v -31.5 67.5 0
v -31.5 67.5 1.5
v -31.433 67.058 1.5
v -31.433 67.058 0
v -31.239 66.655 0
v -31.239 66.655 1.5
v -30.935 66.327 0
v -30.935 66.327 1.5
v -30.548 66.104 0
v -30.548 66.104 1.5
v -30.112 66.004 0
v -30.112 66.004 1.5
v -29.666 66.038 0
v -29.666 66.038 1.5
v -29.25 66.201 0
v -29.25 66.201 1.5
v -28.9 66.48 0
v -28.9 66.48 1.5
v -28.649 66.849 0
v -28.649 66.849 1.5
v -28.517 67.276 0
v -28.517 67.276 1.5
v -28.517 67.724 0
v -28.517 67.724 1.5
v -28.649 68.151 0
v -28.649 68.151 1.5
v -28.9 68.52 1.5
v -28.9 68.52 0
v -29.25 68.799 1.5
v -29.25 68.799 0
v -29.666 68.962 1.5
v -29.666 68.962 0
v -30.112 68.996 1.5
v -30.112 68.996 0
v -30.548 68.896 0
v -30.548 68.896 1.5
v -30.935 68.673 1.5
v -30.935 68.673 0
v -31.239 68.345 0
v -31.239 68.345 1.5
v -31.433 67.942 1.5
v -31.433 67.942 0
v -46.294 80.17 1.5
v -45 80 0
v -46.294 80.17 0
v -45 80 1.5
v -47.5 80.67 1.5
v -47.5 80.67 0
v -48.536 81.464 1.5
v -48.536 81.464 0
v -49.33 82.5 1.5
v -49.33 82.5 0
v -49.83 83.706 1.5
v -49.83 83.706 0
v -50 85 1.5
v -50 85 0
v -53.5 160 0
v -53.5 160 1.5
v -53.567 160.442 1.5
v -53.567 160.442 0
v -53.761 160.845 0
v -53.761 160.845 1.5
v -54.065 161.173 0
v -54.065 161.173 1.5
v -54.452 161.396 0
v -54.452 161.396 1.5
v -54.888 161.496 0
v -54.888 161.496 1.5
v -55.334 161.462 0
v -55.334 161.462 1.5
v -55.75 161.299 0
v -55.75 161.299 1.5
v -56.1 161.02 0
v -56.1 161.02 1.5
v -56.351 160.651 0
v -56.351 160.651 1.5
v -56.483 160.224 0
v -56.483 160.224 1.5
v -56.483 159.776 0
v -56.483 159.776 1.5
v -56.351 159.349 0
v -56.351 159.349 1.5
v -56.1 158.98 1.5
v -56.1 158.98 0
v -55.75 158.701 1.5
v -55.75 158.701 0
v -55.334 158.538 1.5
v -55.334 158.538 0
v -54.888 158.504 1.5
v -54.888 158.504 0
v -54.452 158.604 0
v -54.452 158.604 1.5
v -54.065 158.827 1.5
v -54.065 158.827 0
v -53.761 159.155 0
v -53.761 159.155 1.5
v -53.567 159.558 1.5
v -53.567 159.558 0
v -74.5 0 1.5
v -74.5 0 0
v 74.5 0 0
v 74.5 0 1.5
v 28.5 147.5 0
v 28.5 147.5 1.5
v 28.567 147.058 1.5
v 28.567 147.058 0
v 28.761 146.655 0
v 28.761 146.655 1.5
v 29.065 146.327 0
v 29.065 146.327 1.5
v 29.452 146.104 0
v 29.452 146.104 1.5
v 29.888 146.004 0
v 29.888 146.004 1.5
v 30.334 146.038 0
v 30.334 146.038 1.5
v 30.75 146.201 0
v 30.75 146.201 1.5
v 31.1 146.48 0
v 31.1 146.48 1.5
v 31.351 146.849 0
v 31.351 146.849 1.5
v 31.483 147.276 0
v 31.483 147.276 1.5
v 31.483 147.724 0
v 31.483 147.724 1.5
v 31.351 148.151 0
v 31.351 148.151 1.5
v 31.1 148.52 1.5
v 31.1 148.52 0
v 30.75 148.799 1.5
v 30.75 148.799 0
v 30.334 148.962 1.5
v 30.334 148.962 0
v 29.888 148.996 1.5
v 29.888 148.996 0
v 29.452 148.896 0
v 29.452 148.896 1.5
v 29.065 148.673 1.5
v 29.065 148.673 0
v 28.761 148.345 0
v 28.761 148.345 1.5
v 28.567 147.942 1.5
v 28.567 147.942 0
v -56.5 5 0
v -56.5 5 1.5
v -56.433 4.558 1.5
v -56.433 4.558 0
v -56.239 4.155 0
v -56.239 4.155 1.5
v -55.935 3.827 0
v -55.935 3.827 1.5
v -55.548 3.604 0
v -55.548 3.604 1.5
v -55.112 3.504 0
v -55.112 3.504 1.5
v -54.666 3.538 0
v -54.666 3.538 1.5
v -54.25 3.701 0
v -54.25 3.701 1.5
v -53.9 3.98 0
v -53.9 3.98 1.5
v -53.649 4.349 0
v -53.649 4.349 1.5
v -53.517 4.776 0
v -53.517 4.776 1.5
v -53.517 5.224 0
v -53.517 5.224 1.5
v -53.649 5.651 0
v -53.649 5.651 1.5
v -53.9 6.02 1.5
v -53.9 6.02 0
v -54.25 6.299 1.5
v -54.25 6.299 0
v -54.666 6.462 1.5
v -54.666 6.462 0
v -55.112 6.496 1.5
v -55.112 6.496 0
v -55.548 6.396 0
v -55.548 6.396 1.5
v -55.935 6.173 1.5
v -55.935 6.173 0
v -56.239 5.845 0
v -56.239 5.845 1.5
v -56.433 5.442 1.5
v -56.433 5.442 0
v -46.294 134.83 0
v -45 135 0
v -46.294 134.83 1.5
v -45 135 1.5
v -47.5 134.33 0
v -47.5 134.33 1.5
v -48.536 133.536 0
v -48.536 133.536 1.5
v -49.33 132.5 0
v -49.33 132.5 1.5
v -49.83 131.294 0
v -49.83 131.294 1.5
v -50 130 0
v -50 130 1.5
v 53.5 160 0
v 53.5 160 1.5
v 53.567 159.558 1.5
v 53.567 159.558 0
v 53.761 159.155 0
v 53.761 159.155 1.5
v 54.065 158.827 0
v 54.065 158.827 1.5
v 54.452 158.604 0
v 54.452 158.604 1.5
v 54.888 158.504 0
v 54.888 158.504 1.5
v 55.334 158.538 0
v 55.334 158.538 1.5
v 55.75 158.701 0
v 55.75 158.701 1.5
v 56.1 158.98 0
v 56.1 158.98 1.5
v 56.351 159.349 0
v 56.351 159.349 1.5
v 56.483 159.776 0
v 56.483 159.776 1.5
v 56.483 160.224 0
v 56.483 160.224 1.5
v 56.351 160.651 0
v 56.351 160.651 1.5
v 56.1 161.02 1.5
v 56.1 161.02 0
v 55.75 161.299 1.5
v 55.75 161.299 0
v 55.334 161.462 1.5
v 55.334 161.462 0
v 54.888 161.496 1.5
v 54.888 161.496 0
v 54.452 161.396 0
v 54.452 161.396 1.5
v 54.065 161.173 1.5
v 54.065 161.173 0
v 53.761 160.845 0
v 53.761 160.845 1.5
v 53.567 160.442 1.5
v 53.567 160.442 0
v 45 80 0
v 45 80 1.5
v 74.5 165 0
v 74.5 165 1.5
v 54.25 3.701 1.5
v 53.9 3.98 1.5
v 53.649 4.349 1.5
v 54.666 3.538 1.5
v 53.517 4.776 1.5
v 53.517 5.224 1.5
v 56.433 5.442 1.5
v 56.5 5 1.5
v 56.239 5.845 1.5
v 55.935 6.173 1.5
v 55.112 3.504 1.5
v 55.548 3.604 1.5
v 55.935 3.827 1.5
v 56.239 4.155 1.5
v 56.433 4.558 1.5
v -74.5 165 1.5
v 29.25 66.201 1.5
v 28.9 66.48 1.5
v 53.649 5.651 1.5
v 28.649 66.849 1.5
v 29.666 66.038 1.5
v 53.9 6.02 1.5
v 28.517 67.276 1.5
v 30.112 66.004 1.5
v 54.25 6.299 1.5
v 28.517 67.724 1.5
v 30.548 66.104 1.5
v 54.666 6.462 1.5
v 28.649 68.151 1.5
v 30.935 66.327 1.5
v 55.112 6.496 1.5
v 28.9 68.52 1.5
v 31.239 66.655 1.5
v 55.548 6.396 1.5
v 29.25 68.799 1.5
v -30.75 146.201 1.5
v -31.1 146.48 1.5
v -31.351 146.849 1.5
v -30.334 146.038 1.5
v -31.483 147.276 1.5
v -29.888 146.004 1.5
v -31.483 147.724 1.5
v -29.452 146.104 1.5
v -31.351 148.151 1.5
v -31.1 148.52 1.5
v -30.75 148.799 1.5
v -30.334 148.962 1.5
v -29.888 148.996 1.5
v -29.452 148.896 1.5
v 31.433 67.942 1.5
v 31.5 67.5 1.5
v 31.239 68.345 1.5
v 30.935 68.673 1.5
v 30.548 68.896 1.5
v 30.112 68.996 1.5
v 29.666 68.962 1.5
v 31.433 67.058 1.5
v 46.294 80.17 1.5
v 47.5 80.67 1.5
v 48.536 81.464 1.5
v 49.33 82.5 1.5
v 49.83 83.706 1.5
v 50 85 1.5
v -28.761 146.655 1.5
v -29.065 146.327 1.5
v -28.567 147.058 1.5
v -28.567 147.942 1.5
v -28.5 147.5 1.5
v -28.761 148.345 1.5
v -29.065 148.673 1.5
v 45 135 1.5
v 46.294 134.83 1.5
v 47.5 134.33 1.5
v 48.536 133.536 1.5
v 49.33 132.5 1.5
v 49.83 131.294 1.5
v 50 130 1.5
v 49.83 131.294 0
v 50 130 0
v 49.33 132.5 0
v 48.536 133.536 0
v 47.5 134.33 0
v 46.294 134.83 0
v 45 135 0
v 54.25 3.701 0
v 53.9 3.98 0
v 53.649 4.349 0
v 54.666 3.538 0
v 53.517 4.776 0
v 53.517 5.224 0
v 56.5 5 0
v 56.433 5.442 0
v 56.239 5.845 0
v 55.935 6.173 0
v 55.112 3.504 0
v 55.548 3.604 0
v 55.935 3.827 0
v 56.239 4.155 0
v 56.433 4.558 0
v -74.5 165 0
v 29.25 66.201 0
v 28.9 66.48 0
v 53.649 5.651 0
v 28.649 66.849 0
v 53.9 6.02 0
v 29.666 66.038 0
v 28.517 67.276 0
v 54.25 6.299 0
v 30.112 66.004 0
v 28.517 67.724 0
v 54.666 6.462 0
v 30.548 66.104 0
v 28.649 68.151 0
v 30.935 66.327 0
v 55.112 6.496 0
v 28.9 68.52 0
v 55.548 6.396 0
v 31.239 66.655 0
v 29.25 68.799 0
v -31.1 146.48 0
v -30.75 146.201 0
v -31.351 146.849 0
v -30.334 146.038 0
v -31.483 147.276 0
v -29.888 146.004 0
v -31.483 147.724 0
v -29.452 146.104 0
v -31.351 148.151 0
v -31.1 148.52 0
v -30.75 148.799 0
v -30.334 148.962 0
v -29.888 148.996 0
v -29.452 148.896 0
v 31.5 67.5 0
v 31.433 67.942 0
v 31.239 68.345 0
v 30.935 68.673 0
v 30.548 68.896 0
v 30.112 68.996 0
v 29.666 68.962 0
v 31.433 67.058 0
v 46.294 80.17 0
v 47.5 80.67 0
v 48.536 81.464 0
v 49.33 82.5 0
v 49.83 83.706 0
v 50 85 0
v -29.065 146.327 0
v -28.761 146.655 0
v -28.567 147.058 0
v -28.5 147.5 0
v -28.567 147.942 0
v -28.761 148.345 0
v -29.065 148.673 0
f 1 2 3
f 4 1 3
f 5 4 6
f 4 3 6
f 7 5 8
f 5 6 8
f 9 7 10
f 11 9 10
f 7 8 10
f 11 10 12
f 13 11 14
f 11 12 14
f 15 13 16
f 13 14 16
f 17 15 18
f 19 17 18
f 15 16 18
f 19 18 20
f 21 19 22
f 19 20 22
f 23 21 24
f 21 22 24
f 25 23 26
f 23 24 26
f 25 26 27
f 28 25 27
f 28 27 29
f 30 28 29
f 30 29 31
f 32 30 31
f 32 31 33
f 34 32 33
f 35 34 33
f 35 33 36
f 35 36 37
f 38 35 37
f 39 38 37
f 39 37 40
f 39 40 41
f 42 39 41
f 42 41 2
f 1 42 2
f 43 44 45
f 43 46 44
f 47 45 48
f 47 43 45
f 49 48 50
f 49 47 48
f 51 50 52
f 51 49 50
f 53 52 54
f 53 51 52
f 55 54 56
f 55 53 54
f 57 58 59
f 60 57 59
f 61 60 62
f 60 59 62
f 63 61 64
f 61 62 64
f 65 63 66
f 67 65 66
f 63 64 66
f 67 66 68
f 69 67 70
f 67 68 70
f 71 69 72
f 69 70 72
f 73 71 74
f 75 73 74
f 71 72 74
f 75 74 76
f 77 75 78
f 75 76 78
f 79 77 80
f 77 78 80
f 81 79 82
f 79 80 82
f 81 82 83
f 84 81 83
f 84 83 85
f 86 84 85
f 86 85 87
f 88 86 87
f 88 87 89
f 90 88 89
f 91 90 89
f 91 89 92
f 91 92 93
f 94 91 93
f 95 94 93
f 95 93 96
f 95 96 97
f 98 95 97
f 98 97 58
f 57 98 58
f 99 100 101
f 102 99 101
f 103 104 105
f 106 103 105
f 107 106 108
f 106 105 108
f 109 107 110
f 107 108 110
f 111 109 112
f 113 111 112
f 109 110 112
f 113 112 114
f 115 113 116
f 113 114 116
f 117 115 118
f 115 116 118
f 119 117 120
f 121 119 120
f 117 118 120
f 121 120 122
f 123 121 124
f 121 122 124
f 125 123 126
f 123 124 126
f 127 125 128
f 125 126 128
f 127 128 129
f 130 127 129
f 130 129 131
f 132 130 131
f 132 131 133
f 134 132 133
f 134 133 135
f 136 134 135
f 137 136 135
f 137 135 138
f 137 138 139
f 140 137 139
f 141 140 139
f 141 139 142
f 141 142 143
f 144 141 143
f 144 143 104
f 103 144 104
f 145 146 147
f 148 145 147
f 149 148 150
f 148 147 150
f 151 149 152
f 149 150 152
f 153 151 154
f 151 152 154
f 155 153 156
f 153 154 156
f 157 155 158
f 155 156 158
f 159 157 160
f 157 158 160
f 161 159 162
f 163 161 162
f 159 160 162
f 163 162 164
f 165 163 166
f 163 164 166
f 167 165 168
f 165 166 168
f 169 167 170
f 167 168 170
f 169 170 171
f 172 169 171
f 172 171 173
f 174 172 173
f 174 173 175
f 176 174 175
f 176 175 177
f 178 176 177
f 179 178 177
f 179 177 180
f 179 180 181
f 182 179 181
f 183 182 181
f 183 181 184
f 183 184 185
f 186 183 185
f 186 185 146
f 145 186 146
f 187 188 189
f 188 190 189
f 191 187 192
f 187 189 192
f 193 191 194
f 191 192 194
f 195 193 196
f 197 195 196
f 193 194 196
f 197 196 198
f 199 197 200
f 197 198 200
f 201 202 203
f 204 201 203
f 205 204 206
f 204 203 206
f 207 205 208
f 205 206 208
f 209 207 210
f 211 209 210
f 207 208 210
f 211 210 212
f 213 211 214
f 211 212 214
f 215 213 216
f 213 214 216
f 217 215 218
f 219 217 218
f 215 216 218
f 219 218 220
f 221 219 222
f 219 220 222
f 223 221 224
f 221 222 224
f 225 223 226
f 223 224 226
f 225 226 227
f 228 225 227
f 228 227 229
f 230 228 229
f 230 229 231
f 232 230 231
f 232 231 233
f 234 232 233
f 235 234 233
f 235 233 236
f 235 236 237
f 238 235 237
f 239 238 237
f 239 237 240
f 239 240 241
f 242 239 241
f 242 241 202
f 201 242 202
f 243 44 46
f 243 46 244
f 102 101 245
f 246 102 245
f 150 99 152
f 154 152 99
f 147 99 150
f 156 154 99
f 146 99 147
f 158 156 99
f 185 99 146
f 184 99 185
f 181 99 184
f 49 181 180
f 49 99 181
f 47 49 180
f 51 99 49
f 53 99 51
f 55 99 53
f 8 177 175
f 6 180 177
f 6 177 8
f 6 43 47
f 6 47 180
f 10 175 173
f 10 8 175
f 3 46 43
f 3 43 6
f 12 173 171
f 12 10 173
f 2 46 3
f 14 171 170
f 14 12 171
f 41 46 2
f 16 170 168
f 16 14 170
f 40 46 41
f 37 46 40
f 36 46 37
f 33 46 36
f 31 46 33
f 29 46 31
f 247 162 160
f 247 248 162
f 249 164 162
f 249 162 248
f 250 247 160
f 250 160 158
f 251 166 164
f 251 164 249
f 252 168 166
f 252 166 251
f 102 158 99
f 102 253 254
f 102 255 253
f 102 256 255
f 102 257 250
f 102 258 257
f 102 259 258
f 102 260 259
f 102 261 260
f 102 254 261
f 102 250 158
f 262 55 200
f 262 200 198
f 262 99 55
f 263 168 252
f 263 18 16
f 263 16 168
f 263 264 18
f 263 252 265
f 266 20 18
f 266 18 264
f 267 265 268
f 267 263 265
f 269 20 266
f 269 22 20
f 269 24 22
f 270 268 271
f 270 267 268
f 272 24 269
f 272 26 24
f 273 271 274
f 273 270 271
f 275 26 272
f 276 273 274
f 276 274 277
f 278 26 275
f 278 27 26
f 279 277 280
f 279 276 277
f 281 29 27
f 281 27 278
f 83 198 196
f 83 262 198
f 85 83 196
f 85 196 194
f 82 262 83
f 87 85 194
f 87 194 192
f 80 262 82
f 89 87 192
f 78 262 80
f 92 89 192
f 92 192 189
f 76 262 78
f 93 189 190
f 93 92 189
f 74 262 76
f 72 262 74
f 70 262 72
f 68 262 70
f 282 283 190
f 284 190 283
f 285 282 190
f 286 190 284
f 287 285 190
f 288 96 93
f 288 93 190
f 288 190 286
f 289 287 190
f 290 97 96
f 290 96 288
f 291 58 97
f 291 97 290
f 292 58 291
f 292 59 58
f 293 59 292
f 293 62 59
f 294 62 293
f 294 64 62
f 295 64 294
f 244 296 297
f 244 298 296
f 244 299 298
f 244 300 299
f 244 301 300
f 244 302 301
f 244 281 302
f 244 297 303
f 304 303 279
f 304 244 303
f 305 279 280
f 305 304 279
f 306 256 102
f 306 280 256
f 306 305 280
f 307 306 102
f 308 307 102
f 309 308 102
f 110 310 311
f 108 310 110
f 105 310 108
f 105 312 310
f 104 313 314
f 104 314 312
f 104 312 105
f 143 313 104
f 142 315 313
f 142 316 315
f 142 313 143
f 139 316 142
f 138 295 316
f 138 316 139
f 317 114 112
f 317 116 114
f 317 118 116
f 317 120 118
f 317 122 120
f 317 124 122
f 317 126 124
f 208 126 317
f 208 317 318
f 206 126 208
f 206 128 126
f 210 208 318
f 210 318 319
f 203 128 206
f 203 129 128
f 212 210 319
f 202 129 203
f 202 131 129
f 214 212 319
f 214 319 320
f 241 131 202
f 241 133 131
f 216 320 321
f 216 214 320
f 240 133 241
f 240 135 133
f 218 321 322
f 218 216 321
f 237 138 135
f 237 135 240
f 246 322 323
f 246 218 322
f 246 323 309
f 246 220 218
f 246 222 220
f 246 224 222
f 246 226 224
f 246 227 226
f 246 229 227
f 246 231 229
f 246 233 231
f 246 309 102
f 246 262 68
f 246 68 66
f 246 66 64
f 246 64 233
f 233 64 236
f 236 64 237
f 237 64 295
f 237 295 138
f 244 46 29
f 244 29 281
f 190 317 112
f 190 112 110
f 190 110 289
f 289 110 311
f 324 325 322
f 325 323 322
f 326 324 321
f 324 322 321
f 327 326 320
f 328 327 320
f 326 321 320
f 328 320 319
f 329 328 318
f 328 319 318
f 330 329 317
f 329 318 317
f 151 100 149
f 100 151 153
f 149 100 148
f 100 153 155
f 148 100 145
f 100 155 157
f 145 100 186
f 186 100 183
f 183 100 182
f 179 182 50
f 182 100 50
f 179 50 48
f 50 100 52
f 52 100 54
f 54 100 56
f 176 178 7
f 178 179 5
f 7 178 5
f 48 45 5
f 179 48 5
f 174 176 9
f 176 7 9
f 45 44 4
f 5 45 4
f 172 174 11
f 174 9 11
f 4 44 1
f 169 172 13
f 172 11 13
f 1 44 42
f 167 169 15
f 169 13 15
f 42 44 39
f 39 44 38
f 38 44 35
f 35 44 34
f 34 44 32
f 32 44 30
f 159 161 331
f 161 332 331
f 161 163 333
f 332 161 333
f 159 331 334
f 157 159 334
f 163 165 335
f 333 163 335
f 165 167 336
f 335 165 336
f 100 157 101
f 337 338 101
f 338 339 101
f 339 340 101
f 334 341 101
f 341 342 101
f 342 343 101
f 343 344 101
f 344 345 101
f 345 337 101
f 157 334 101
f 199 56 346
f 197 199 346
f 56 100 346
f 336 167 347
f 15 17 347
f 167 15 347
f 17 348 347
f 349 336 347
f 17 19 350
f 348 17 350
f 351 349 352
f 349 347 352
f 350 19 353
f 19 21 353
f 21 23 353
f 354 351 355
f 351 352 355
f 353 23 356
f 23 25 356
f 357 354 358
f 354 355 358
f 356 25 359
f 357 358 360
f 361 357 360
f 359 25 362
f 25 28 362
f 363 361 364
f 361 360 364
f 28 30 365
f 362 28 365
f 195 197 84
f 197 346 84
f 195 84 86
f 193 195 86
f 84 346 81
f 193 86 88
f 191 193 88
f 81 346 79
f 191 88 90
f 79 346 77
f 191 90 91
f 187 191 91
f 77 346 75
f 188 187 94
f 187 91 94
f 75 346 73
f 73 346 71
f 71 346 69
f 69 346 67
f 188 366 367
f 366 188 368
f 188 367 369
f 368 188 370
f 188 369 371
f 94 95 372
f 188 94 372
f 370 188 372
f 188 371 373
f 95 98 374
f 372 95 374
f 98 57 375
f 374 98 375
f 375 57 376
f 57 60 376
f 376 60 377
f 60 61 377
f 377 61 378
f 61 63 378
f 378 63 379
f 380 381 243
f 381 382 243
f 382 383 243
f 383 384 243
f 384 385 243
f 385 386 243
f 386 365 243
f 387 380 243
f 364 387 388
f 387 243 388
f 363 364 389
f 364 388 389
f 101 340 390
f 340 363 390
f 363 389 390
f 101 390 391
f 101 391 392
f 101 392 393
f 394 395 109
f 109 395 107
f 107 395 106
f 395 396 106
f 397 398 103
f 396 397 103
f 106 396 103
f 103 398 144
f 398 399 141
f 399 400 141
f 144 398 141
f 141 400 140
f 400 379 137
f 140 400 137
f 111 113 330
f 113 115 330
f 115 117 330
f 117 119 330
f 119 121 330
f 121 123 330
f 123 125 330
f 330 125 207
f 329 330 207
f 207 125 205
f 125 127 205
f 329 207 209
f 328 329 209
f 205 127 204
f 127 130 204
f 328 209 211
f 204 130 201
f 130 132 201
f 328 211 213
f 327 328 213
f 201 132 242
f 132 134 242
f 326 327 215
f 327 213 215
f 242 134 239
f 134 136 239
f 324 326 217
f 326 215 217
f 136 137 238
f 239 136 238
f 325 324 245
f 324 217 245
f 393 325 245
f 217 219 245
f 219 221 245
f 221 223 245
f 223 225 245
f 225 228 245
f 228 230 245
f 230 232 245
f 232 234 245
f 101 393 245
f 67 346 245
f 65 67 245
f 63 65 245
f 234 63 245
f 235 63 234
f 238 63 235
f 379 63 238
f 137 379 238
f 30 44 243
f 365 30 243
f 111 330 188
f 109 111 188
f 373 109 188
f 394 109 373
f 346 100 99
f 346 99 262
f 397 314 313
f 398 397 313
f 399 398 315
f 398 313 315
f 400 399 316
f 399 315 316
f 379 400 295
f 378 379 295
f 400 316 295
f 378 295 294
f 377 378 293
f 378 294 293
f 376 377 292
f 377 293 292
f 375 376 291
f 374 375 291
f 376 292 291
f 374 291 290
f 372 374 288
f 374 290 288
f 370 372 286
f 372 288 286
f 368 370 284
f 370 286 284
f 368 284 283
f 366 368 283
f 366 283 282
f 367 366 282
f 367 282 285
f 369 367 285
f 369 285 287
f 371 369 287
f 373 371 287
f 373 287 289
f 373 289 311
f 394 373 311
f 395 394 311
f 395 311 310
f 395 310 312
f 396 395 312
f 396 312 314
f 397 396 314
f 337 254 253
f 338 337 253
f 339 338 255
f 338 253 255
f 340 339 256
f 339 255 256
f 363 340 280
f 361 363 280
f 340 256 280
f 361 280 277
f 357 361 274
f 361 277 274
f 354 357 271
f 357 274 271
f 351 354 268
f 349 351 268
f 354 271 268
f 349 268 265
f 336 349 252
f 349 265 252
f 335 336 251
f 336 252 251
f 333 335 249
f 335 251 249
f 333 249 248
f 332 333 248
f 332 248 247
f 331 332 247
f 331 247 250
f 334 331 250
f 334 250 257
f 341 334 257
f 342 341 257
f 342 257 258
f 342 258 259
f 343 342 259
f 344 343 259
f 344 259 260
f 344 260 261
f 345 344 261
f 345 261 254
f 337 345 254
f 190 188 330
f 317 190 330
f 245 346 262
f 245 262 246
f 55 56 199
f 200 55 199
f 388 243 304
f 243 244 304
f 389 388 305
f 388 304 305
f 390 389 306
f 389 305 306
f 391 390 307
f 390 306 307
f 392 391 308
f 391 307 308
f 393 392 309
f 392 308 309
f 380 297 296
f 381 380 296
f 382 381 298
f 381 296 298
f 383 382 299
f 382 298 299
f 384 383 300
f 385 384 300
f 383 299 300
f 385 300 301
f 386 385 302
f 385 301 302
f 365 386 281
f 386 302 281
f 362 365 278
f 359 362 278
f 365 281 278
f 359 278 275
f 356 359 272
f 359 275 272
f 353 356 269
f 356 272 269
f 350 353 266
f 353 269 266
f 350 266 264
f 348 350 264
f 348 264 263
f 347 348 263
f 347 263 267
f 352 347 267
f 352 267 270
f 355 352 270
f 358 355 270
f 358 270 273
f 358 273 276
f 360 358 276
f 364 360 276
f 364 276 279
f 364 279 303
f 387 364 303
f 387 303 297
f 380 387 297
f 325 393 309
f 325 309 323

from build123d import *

# Parameters (mm, degrees)
ESQUISSE1_W             = 149
ESQUISSE1_H             = 165
ESQUISSE1_W_2           = 100
ESQUISSE1_H_2           = 55
BOSS_EXTRU_1_DEPTH      = 1.5
CONG_1_R                = 5
ESQUISSE2_R             = 1.5
ENL_V_MAT_EXTRU_1_DEPTH = 182.045574373


with BuildPart() as part:
    # Esquisse1 → Boss.-Extru.1 (new body)
    with BuildSketch(Plane.XY):
        with Locations((0, 82.5)):
            Rectangle(ESQUISSE1_W, ESQUISSE1_H)
        with Locations((0, 107.5)):
            Rectangle(ESQUISSE1_W_2, ESQUISSE1_H_2, mode=Mode.SUBTRACT)
    extrude(amount=BOSS_EXTRU_1_DEPTH)

    # Congé1
    cong_1_edges = [part.edges().sort_by_distance(p)[0] for p in [
        (-50, 135, 0.75),
        (-50, 80, 0.75),
        (50, 80, 0.75),
        (50, 135, 0.75),
    ]]
    fillet(cong_1_edges, radius=CONG_1_R)

    # Esquisse2 → Enlèv. mat.-Extru.1 (cut, through all)
    with BuildSketch(Plane.XY.offset(1.5)):
        with Locations((-30, 147.5)):
            Circle(ESQUISSE2_R)
        with Locations(Location((-30, 67.5, 0), (0, 0, 180))):
            Circle(ESQUISSE2_R)
        with Locations((30, 67.5)):
            Circle(ESQUISSE2_R)
        with Locations(Location((30, 147.5, 0), (0, 0, 180))):
            Circle(ESQUISSE2_R)
        with Locations((-55, 160)):
            Circle(ESQUISSE2_R)
        with Locations(Location((-55, 5, 0), (0, 0, 180))):
            Circle(ESQUISSE2_R)
        with Locations((55, 5)):
            Circle(ESQUISSE2_R)
        with Locations(Location((55, 160, 0), (0, 0, 180))):
            Circle(ESQUISSE2_R)
    extrude(amount=-ENL_V_MAT_EXTRU_1_DEPTH, mode=Mode.SUBTRACT)


solid = part.part
